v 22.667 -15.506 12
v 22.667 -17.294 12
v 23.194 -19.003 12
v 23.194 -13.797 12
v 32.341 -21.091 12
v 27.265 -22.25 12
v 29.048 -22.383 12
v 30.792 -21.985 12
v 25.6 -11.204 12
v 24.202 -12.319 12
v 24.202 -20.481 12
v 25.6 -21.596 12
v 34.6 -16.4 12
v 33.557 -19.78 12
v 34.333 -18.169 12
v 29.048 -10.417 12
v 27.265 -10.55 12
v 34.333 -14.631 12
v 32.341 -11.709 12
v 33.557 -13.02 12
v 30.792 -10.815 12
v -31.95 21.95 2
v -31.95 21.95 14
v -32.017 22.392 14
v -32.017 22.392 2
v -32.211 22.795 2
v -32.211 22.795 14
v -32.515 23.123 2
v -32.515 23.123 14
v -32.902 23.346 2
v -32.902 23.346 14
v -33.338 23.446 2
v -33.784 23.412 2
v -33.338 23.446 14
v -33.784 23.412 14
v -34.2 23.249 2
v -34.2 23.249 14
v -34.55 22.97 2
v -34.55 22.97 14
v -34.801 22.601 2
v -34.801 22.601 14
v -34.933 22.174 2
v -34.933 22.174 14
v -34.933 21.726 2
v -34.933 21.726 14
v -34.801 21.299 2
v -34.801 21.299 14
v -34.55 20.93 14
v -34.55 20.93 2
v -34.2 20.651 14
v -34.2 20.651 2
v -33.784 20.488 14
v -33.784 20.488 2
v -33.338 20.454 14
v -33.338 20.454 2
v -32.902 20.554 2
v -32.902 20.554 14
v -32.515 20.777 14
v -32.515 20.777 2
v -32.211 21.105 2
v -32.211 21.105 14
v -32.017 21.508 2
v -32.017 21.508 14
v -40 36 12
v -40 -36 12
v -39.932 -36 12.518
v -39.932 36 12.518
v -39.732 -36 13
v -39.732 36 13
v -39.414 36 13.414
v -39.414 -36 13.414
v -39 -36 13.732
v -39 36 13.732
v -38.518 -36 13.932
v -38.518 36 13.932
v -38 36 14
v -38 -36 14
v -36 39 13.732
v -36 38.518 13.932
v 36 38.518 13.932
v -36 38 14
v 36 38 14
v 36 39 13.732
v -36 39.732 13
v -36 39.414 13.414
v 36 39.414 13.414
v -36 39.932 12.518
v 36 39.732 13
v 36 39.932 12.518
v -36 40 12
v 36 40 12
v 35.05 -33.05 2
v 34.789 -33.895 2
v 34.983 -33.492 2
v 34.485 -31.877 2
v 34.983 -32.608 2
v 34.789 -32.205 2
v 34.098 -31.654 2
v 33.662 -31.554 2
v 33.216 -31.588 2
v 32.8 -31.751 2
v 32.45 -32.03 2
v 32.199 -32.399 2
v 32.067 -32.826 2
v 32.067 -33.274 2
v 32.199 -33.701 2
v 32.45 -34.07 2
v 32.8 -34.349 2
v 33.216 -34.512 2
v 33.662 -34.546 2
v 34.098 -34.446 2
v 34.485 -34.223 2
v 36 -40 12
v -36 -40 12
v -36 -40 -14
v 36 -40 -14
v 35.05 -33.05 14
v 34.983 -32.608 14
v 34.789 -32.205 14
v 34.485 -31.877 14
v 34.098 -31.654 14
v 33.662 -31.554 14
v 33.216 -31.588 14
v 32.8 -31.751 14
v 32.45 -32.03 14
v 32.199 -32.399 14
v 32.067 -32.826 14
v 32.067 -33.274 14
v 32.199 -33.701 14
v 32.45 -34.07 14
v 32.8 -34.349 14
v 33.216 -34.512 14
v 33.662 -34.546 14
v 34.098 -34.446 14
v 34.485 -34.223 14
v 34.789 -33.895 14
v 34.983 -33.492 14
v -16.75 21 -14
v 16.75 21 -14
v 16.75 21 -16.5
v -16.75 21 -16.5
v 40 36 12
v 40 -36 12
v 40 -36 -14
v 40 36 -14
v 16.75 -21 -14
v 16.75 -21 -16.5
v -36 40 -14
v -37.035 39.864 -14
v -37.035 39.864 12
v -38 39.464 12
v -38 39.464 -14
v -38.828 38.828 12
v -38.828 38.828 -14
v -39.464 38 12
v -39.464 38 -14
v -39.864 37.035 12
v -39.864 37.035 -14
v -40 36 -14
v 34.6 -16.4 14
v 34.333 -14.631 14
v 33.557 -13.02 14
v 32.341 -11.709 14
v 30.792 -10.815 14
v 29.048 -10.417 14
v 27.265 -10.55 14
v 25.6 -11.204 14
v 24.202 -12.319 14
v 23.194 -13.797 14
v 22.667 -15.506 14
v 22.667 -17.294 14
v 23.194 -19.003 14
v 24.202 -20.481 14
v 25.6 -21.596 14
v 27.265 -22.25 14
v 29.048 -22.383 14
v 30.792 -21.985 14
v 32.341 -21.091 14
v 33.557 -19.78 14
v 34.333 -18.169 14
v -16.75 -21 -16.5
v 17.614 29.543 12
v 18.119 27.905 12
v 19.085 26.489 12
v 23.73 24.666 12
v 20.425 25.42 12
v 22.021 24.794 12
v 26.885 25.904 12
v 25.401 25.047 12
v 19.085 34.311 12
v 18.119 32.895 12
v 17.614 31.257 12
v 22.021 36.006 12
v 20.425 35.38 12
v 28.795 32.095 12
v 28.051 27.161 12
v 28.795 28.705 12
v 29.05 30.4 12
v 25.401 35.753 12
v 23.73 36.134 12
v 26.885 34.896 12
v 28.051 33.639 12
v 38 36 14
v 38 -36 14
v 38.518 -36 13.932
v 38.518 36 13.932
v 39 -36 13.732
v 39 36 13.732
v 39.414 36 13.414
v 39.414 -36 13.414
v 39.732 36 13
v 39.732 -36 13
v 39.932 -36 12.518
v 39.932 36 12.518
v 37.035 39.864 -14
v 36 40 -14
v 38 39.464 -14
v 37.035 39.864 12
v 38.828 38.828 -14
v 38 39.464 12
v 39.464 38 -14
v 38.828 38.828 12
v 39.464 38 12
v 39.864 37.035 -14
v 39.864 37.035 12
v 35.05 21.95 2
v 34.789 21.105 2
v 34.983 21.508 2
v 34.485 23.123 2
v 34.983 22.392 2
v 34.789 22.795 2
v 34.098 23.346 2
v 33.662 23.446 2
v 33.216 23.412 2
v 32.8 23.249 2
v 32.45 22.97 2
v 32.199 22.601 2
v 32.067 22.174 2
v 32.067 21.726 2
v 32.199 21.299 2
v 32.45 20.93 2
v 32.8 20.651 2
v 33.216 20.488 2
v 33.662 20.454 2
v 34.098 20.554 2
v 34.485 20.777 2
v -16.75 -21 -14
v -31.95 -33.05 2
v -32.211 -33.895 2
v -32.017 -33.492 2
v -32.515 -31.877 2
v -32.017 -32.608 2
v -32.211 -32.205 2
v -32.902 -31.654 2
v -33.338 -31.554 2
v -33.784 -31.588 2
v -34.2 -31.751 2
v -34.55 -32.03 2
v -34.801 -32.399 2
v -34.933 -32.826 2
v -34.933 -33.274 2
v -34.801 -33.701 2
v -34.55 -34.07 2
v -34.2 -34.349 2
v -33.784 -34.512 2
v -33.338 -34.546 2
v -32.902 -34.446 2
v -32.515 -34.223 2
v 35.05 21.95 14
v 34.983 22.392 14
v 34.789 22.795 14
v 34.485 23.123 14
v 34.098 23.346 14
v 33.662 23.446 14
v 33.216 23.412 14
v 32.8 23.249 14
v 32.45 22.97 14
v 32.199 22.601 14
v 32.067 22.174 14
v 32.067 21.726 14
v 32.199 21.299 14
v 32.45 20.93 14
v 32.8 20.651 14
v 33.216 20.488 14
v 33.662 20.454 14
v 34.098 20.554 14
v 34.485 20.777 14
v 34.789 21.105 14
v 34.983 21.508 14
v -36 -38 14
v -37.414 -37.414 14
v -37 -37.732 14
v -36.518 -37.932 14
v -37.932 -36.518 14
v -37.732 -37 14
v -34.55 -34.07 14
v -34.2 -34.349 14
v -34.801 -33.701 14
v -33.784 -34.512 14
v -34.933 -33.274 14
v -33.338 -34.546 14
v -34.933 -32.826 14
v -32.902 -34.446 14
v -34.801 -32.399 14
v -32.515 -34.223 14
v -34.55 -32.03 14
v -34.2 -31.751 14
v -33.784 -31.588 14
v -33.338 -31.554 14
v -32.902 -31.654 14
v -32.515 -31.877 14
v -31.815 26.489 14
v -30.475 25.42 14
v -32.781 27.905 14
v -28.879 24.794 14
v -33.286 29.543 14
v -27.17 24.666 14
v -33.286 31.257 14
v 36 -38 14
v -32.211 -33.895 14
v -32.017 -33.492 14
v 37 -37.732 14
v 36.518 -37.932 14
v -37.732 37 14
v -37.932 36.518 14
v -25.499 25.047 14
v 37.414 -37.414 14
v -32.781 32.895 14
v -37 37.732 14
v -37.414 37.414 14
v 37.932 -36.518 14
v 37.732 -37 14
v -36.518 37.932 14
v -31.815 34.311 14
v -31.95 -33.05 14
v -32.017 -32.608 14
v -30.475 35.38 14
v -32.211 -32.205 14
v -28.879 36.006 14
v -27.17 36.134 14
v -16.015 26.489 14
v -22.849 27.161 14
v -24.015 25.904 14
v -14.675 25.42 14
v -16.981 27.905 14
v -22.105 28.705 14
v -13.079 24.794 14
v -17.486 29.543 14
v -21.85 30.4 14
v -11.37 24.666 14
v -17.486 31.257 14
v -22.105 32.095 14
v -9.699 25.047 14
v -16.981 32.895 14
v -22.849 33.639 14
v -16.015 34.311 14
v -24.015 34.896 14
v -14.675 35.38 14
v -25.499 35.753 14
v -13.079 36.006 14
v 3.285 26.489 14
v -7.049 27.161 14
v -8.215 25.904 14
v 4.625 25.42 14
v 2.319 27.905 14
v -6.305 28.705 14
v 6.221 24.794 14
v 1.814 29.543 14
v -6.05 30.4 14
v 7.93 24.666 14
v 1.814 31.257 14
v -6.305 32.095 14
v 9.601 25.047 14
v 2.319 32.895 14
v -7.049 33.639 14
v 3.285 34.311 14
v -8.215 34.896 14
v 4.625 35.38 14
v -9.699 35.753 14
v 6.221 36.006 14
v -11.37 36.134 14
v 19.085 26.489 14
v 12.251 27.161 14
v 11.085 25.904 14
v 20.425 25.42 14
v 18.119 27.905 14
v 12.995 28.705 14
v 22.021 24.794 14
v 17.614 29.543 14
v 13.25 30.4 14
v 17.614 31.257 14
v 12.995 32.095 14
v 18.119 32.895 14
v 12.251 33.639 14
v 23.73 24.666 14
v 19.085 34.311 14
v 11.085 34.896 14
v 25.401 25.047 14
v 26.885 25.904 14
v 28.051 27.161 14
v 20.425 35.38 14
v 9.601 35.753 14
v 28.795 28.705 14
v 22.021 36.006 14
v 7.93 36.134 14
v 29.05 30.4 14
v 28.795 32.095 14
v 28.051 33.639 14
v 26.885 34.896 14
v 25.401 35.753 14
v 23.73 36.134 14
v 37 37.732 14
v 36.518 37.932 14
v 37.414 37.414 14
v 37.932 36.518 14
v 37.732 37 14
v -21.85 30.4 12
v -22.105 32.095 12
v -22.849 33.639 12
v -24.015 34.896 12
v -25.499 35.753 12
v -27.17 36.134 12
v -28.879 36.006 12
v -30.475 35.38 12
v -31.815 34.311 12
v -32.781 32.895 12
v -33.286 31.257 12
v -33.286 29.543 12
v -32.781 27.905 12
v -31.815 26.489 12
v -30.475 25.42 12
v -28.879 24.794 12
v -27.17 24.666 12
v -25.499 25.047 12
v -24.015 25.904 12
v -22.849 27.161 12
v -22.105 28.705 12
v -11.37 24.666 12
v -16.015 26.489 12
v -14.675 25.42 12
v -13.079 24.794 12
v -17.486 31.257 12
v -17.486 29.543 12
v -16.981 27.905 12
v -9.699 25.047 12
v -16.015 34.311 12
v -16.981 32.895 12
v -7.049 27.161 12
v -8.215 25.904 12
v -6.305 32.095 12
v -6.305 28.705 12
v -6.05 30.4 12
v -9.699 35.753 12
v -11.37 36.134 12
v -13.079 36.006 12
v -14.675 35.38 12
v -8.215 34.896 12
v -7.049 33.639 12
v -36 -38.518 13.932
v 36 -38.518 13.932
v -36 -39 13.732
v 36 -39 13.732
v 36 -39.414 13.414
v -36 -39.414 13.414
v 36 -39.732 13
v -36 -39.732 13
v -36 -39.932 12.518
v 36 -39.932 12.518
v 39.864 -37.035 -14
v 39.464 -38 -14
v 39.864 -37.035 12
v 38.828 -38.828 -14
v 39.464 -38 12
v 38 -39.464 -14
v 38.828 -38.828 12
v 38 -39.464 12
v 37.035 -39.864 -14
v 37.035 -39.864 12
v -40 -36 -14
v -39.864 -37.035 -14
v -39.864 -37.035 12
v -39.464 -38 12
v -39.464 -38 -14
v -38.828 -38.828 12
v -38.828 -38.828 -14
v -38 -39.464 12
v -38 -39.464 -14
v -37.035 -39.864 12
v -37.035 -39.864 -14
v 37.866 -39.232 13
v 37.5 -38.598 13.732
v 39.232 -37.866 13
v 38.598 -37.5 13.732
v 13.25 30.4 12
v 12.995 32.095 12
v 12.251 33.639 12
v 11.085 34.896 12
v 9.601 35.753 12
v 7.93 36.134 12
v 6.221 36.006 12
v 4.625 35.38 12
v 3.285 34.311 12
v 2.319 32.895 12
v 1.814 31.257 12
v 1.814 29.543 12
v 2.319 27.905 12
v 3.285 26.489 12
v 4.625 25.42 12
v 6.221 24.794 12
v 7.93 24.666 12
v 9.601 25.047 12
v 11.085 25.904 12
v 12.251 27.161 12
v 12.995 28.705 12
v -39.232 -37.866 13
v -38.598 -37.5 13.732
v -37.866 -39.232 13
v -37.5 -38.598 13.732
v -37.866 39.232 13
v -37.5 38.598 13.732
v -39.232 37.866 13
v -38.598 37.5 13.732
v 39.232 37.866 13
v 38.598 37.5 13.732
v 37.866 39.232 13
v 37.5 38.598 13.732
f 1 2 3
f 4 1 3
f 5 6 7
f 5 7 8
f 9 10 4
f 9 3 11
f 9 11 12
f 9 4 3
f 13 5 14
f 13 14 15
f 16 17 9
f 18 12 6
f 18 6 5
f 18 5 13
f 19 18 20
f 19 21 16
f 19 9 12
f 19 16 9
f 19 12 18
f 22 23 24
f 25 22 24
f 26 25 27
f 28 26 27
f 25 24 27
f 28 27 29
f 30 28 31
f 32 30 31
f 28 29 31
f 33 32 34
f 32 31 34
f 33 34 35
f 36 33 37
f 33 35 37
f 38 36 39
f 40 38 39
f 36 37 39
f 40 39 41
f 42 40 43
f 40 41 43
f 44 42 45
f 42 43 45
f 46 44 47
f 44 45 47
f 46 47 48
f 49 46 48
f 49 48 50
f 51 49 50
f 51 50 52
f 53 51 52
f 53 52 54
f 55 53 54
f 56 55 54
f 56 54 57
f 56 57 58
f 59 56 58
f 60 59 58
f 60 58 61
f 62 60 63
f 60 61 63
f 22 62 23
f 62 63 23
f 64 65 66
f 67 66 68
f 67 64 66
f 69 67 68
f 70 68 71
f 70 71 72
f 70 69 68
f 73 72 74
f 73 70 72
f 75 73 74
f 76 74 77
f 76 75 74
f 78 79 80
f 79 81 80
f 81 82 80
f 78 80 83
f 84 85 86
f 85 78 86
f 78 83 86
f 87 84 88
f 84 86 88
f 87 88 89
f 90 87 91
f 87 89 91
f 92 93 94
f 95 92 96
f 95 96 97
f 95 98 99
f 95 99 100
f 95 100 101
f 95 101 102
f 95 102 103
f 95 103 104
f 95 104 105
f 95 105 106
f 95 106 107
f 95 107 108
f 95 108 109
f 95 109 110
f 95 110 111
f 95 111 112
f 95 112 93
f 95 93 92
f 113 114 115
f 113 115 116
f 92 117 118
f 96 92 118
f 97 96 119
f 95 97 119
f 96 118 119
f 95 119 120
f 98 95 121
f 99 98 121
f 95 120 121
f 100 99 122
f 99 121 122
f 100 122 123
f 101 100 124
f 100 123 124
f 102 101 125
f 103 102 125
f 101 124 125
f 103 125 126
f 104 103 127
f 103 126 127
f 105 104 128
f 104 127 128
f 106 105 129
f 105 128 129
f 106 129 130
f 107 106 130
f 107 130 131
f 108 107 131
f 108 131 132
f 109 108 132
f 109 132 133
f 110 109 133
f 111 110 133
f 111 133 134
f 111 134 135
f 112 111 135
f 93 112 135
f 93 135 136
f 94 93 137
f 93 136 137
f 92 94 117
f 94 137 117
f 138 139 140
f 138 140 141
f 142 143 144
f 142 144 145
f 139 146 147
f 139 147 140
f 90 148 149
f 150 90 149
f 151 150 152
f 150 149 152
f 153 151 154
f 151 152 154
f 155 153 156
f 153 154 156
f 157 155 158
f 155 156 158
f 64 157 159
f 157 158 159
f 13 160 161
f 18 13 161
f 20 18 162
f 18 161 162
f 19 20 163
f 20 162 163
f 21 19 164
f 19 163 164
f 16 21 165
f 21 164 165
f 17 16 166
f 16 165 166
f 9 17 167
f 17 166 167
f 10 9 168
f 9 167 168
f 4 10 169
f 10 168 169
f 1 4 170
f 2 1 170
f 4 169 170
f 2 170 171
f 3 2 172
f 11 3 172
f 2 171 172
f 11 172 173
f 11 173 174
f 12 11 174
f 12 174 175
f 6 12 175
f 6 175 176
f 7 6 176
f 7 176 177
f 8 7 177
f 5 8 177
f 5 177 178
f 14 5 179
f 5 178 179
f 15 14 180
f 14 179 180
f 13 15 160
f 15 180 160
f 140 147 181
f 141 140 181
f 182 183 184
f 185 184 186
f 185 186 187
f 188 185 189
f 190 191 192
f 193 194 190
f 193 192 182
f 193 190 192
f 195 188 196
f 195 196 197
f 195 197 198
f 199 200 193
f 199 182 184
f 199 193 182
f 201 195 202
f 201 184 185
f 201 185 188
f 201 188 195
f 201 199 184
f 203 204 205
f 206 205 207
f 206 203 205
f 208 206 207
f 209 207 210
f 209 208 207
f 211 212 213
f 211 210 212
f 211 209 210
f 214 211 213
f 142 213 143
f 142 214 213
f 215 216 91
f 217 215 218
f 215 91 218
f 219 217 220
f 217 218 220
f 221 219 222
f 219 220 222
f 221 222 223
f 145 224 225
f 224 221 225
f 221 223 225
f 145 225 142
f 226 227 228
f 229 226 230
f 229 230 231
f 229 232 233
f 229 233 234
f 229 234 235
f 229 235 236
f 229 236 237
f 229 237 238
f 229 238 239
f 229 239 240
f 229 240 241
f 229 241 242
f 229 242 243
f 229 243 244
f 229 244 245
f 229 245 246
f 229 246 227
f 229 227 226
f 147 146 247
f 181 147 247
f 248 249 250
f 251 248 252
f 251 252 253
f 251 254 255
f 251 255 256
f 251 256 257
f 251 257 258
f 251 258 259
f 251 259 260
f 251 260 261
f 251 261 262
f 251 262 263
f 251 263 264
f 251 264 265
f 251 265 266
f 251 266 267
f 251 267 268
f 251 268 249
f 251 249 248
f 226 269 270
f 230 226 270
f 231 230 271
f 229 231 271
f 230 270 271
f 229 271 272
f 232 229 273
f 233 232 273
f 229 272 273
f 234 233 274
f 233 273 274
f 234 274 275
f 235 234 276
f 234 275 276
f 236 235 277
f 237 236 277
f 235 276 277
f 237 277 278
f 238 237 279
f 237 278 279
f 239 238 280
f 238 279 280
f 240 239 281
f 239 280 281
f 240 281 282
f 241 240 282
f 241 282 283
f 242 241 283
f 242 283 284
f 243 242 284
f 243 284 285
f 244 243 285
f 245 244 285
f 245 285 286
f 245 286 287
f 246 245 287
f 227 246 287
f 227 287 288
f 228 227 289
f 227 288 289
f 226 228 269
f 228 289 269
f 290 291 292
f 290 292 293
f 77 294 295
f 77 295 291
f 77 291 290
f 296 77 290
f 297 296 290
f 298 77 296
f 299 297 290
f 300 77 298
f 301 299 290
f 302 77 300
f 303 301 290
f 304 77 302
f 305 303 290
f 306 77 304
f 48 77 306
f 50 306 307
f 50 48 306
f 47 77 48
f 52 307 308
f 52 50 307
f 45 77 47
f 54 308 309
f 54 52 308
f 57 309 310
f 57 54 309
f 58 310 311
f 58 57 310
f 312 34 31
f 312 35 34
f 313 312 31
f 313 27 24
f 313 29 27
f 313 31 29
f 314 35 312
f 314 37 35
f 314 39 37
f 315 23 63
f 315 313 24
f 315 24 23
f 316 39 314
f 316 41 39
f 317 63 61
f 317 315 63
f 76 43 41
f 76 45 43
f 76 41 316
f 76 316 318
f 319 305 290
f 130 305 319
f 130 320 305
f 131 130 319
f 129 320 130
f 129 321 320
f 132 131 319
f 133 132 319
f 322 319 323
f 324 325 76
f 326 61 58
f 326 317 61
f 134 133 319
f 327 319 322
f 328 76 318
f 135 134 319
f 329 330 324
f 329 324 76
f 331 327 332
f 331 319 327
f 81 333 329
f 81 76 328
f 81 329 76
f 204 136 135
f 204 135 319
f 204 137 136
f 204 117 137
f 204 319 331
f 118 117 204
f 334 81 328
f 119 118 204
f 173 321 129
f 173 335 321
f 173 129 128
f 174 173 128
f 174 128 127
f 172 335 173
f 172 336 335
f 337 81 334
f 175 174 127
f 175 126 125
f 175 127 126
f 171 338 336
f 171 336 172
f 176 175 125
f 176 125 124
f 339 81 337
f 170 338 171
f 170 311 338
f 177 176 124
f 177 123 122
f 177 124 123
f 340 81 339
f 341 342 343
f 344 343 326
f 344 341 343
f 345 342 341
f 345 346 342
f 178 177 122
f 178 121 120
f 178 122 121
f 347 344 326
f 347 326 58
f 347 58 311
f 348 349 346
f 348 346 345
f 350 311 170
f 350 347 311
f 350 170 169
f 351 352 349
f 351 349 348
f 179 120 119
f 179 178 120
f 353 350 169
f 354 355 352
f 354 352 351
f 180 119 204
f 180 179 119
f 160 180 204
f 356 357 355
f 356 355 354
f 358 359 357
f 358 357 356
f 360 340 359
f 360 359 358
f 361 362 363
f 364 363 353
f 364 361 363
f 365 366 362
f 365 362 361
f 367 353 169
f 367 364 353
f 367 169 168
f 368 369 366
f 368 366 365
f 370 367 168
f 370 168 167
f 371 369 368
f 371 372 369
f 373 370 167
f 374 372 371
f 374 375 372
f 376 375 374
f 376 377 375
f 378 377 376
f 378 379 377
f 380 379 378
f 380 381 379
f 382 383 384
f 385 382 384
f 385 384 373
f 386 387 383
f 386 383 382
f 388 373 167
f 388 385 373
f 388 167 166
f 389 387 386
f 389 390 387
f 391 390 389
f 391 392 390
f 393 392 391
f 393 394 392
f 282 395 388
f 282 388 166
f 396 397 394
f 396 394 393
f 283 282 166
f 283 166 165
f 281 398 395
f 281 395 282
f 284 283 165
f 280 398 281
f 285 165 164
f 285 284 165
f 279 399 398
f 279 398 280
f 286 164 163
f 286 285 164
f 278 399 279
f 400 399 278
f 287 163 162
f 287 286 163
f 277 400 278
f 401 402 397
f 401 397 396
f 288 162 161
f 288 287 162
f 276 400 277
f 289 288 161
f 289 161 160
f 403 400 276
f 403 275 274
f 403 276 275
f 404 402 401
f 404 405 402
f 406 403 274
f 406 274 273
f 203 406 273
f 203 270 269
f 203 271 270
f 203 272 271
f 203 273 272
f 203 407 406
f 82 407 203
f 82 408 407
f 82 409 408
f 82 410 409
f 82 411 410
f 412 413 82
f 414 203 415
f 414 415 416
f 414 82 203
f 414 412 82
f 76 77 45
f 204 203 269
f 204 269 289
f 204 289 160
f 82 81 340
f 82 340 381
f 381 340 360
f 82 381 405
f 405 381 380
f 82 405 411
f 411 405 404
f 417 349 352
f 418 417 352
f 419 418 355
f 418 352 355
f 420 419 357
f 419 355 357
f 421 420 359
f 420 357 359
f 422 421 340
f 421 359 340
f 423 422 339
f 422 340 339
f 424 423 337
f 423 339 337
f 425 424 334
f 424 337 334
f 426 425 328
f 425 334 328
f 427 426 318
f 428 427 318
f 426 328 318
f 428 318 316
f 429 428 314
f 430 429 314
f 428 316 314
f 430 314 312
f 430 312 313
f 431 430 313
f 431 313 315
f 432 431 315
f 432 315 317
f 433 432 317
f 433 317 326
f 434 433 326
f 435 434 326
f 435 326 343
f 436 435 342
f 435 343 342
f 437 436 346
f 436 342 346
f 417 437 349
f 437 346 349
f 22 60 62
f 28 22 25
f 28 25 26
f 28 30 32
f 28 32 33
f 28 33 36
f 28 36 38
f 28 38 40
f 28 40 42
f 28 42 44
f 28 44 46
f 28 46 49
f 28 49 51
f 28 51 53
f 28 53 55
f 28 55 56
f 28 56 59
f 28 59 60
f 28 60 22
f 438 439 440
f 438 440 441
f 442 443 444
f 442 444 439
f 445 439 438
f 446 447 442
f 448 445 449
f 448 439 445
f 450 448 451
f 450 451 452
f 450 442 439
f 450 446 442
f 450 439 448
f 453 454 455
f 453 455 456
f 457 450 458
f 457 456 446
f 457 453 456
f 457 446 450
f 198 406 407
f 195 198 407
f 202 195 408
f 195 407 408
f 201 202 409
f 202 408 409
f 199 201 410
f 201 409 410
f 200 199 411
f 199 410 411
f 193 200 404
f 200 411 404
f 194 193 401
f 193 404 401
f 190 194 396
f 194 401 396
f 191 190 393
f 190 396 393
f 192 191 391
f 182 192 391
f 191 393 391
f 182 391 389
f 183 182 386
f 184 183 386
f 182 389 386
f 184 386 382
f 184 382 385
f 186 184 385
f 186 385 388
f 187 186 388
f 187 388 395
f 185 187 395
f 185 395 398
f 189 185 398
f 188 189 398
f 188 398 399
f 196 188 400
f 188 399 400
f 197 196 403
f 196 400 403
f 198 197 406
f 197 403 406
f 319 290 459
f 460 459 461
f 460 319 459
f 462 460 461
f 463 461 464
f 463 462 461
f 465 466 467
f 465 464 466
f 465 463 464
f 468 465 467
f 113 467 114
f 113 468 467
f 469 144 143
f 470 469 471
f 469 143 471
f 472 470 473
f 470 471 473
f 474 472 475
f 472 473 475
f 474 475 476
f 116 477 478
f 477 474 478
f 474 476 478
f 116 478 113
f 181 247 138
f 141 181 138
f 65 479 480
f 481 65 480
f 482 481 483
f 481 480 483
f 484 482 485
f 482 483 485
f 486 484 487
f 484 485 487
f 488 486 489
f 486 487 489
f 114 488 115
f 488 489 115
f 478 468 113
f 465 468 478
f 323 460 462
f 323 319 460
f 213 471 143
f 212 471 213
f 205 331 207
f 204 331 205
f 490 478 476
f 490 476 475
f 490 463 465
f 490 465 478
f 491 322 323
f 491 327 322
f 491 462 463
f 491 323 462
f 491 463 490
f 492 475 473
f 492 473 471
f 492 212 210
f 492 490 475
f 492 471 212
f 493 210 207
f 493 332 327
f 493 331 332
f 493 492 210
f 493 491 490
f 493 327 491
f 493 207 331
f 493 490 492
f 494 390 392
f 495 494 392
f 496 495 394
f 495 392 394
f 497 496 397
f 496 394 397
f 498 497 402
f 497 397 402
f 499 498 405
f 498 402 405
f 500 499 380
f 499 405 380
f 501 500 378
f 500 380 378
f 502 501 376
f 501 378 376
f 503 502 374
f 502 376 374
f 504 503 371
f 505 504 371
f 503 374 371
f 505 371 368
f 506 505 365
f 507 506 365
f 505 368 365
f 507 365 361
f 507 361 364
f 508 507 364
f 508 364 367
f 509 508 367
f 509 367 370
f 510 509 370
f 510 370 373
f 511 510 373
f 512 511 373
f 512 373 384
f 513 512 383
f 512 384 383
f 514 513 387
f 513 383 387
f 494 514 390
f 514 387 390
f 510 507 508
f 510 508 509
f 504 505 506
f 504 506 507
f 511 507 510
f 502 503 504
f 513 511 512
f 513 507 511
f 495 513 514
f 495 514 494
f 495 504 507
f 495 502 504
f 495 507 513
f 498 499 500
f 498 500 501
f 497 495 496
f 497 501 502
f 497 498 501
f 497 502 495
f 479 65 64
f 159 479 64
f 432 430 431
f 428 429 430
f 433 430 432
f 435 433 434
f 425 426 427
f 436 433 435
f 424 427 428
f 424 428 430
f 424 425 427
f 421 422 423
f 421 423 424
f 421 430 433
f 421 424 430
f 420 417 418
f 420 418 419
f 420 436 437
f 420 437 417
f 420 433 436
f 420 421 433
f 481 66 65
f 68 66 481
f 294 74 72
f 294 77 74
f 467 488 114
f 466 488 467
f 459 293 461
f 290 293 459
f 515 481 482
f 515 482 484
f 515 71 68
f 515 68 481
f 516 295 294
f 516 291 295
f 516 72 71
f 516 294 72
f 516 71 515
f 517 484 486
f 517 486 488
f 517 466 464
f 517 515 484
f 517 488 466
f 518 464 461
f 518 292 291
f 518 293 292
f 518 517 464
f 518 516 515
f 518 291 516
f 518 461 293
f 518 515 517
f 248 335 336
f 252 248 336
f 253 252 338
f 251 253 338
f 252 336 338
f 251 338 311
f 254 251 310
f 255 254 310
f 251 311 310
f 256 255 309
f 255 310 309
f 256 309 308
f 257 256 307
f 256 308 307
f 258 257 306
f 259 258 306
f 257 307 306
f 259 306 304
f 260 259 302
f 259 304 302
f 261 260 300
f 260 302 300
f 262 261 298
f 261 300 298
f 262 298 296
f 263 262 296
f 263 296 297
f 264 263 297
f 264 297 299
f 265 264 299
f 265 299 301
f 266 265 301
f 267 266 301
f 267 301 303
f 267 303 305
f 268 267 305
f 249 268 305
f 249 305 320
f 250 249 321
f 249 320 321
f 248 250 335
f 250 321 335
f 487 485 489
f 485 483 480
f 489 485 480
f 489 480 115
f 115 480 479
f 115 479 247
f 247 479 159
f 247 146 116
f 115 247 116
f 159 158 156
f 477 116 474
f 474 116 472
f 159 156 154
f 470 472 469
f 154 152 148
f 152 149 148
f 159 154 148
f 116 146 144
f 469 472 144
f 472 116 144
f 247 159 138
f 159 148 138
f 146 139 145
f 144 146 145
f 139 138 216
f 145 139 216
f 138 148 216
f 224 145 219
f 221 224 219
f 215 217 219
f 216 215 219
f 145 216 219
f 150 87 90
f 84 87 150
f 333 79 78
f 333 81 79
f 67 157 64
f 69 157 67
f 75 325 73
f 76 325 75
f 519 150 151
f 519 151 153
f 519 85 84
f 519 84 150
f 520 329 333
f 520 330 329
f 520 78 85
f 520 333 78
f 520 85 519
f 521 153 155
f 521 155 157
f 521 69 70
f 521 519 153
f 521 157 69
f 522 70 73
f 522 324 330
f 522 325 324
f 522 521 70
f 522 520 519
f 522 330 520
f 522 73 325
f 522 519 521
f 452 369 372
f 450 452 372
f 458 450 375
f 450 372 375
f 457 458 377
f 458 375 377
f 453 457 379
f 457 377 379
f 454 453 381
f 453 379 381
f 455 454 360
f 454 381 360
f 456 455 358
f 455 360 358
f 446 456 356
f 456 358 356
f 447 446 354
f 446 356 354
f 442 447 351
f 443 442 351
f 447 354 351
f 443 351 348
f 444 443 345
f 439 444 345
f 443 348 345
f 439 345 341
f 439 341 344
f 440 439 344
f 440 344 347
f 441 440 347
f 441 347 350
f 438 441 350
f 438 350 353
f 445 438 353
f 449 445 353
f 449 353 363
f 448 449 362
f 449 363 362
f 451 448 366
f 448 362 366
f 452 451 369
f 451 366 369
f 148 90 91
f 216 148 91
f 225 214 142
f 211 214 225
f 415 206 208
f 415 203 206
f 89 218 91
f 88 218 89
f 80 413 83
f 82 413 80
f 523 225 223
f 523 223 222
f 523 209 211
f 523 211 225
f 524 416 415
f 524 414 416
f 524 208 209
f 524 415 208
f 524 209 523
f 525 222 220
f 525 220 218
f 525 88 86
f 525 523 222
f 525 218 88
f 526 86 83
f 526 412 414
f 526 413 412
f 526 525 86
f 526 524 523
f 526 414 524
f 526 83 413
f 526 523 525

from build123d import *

# Parameters (mm, degrees)
SKETCH1_W           = 80
SKETCH1_H           = 80
BOSS_EXTRUDE1_DEPTH = 14
FILLET1_R           = 2
FILLET2_R           = 4
SKETCH2_R           = 5.75
CUT_EXTRUDE1_DEPTH  = 2
SKETCH3_R           = 1.5
CUT_EXTRUDE2_DEPTH  = 12
SKETCH6_R           = 6
CUT_EXTRUDE3_DEPTH  = 2
SKETCH7_W           = 33.5
SKETCH7_H           = 42
BOSS_EXTRUDE2_DEPTH = 2.5


with BuildPart() as part:
    # Sketch1 → Boss-Extrude1 (new, symmetric)
    with BuildSketch(Plane.XY):
        Rectangle(SKETCH1_W, SKETCH1_H)
    extrude(amount=BOSS_EXTRUDE1_DEPTH, both=True)

    # Fillet1
    fillet1_edges = [part.edges().sort_by_distance(p)[0] for p in [
        (-40, 0, 14),
        (0, -40, 14),
        (40, 0, 14),
        (0, 40, 14),
    ]]
    fillet(fillet1_edges, radius=FILLET1_R)

    # Fillet2
    # the kernel refuses this fillet: 4 mm, written as the material it takes off along each edge
    with BuildSketch(Plane(origin=(-36, -36, 14), x_dir=(-1, 0, 0), z_dir=(0, 1, 0))) as fillet2_piece_1:
        with BuildLine():
            CenterArc((2, -2), 2, 0, 90)
            Line((4, -2), (4, 0))
            Line((4, 0), (2, 0))
        make_face()
    revolve(axis=Axis((-36, -36, 14), (0, 0, 1)), revolution_arc=90, mode=Mode.SUBTRACT)
    with BuildSketch(Plane(origin=(-36, 36, 14), x_dir=(0, 1, 0), z_dir=(1, 0, 0))) as fillet2_piece_2:
        with BuildLine():
            CenterArc((2, -2), 2, 0, 90)
            Line((4, -2), (4, 0))
            Line((4, 0), (2, 0))
        make_face()
    revolve(axis=Axis((-36, 36, 14), (0, 0, 1)), revolution_arc=90, mode=Mode.SUBTRACT)
    with BuildSketch(Plane(origin=(36, -36, 14), x_dir=(0, -1, 0), z_dir=(-1, 0, 0))) as fillet2_piece_3:
        with BuildLine():
            CenterArc((2, -2), 2, 0, 90)
            Line((4, -2), (4, 0))
            Line((4, 0), (2, 0))
        make_face()
    revolve(axis=Axis((36, -36, 14), (0, 0, 1)), revolution_arc=90, mode=Mode.SUBTRACT)
    with BuildSketch(Plane(origin=(36, 36, 14), x_dir=(1, 0, 0), z_dir=(0, -1, 0))) as fillet2_piece_4:
        with BuildLine():
            CenterArc((2, -2), 2, 0, 90)
            Line((4, -2), (4, 0))
            Line((4, 0), (2, 0))
        make_face()
    revolve(axis=Axis((36, 36, 14), (0, 0, 1)), revolution_arc=90, mode=Mode.SUBTRACT)
    with BuildSketch(Plane(origin=(40, 40, 14), x_dir=(-1, 0, 0), z_dir=(0, 0, -1)), Plane(origin=(40, -40, 14), x_dir=(0, 1, 0), z_dir=(0, 0, -1)), Plane(origin=(-40, -40, -24), x_dir=(0, 1, 0), z_dir=(0, 0, 1)), Plane(origin=(-40, 40, -24), x_dir=(1, 0, 0), z_dir=(0, 0, 1))) as fillet2_piece_5:
        with BuildLine():
            CenterArc((FILLET2_R, -FILLET2_R), FILLET2_R, 90, 90)
            Line((0, -FILLET2_R), (0, 0))
            Line((0, 0), (FILLET2_R, 0))
        make_face()
    extrude(amount=38, mode=Mode.SUBTRACT)

    # Sketch2 → Cut-Extrude1 (cut)
    with BuildSketch(Plane.XY.offset(14)):
        with Locations((-27.6, 30.4)):
            Circle(SKETCH2_R)
        with Locations((-11.8, 30.4)):
            Circle(SKETCH2_R)
        with Locations((7.5, 30.4)):
            Circle(SKETCH2_R)
        with Locations((23.3, 30.4)):
            Circle(SKETCH2_R)
    extrude(amount=-CUT_EXTRUDE1_DEPTH, mode=Mode.SUBTRACT)

    # Sketch3 → Cut-Extrude2 (cut)
    with BuildSketch(Plane.XY.offset(14)):
        with Locations((-33.45, 21.95)):
            Circle(SKETCH3_R)
        with Locations((33.55, 21.95)):
            Circle(SKETCH3_R)
        with Locations((-33.45, -33.05)):
            Circle(SKETCH3_R)
        with Locations((33.55, -33.05)):
            Circle(SKETCH3_R)
    extrude(amount=-CUT_EXTRUDE2_DEPTH, mode=Mode.SUBTRACT)

    # Sketch6 → Cut-Extrude3 (cut)
    with BuildSketch(Plane.XY.offset(14)):
        with Locations((28.6, -16.4)):
            Circle(SKETCH6_R)
    extrude(amount=-CUT_EXTRUDE3_DEPTH, mode=Mode.SUBTRACT)

    # Sketch7 → Boss-Extrude2 (add)
    with BuildSketch(Plane(origin=(0, 0, -14), x_dir=(-1, 0, 0), z_dir=(0, 0, -1))):
        Rectangle(SKETCH7_W, SKETCH7_H)
    extrude(amount=BOSS_EXTRUDE2_DEPTH)


solid = part.part
